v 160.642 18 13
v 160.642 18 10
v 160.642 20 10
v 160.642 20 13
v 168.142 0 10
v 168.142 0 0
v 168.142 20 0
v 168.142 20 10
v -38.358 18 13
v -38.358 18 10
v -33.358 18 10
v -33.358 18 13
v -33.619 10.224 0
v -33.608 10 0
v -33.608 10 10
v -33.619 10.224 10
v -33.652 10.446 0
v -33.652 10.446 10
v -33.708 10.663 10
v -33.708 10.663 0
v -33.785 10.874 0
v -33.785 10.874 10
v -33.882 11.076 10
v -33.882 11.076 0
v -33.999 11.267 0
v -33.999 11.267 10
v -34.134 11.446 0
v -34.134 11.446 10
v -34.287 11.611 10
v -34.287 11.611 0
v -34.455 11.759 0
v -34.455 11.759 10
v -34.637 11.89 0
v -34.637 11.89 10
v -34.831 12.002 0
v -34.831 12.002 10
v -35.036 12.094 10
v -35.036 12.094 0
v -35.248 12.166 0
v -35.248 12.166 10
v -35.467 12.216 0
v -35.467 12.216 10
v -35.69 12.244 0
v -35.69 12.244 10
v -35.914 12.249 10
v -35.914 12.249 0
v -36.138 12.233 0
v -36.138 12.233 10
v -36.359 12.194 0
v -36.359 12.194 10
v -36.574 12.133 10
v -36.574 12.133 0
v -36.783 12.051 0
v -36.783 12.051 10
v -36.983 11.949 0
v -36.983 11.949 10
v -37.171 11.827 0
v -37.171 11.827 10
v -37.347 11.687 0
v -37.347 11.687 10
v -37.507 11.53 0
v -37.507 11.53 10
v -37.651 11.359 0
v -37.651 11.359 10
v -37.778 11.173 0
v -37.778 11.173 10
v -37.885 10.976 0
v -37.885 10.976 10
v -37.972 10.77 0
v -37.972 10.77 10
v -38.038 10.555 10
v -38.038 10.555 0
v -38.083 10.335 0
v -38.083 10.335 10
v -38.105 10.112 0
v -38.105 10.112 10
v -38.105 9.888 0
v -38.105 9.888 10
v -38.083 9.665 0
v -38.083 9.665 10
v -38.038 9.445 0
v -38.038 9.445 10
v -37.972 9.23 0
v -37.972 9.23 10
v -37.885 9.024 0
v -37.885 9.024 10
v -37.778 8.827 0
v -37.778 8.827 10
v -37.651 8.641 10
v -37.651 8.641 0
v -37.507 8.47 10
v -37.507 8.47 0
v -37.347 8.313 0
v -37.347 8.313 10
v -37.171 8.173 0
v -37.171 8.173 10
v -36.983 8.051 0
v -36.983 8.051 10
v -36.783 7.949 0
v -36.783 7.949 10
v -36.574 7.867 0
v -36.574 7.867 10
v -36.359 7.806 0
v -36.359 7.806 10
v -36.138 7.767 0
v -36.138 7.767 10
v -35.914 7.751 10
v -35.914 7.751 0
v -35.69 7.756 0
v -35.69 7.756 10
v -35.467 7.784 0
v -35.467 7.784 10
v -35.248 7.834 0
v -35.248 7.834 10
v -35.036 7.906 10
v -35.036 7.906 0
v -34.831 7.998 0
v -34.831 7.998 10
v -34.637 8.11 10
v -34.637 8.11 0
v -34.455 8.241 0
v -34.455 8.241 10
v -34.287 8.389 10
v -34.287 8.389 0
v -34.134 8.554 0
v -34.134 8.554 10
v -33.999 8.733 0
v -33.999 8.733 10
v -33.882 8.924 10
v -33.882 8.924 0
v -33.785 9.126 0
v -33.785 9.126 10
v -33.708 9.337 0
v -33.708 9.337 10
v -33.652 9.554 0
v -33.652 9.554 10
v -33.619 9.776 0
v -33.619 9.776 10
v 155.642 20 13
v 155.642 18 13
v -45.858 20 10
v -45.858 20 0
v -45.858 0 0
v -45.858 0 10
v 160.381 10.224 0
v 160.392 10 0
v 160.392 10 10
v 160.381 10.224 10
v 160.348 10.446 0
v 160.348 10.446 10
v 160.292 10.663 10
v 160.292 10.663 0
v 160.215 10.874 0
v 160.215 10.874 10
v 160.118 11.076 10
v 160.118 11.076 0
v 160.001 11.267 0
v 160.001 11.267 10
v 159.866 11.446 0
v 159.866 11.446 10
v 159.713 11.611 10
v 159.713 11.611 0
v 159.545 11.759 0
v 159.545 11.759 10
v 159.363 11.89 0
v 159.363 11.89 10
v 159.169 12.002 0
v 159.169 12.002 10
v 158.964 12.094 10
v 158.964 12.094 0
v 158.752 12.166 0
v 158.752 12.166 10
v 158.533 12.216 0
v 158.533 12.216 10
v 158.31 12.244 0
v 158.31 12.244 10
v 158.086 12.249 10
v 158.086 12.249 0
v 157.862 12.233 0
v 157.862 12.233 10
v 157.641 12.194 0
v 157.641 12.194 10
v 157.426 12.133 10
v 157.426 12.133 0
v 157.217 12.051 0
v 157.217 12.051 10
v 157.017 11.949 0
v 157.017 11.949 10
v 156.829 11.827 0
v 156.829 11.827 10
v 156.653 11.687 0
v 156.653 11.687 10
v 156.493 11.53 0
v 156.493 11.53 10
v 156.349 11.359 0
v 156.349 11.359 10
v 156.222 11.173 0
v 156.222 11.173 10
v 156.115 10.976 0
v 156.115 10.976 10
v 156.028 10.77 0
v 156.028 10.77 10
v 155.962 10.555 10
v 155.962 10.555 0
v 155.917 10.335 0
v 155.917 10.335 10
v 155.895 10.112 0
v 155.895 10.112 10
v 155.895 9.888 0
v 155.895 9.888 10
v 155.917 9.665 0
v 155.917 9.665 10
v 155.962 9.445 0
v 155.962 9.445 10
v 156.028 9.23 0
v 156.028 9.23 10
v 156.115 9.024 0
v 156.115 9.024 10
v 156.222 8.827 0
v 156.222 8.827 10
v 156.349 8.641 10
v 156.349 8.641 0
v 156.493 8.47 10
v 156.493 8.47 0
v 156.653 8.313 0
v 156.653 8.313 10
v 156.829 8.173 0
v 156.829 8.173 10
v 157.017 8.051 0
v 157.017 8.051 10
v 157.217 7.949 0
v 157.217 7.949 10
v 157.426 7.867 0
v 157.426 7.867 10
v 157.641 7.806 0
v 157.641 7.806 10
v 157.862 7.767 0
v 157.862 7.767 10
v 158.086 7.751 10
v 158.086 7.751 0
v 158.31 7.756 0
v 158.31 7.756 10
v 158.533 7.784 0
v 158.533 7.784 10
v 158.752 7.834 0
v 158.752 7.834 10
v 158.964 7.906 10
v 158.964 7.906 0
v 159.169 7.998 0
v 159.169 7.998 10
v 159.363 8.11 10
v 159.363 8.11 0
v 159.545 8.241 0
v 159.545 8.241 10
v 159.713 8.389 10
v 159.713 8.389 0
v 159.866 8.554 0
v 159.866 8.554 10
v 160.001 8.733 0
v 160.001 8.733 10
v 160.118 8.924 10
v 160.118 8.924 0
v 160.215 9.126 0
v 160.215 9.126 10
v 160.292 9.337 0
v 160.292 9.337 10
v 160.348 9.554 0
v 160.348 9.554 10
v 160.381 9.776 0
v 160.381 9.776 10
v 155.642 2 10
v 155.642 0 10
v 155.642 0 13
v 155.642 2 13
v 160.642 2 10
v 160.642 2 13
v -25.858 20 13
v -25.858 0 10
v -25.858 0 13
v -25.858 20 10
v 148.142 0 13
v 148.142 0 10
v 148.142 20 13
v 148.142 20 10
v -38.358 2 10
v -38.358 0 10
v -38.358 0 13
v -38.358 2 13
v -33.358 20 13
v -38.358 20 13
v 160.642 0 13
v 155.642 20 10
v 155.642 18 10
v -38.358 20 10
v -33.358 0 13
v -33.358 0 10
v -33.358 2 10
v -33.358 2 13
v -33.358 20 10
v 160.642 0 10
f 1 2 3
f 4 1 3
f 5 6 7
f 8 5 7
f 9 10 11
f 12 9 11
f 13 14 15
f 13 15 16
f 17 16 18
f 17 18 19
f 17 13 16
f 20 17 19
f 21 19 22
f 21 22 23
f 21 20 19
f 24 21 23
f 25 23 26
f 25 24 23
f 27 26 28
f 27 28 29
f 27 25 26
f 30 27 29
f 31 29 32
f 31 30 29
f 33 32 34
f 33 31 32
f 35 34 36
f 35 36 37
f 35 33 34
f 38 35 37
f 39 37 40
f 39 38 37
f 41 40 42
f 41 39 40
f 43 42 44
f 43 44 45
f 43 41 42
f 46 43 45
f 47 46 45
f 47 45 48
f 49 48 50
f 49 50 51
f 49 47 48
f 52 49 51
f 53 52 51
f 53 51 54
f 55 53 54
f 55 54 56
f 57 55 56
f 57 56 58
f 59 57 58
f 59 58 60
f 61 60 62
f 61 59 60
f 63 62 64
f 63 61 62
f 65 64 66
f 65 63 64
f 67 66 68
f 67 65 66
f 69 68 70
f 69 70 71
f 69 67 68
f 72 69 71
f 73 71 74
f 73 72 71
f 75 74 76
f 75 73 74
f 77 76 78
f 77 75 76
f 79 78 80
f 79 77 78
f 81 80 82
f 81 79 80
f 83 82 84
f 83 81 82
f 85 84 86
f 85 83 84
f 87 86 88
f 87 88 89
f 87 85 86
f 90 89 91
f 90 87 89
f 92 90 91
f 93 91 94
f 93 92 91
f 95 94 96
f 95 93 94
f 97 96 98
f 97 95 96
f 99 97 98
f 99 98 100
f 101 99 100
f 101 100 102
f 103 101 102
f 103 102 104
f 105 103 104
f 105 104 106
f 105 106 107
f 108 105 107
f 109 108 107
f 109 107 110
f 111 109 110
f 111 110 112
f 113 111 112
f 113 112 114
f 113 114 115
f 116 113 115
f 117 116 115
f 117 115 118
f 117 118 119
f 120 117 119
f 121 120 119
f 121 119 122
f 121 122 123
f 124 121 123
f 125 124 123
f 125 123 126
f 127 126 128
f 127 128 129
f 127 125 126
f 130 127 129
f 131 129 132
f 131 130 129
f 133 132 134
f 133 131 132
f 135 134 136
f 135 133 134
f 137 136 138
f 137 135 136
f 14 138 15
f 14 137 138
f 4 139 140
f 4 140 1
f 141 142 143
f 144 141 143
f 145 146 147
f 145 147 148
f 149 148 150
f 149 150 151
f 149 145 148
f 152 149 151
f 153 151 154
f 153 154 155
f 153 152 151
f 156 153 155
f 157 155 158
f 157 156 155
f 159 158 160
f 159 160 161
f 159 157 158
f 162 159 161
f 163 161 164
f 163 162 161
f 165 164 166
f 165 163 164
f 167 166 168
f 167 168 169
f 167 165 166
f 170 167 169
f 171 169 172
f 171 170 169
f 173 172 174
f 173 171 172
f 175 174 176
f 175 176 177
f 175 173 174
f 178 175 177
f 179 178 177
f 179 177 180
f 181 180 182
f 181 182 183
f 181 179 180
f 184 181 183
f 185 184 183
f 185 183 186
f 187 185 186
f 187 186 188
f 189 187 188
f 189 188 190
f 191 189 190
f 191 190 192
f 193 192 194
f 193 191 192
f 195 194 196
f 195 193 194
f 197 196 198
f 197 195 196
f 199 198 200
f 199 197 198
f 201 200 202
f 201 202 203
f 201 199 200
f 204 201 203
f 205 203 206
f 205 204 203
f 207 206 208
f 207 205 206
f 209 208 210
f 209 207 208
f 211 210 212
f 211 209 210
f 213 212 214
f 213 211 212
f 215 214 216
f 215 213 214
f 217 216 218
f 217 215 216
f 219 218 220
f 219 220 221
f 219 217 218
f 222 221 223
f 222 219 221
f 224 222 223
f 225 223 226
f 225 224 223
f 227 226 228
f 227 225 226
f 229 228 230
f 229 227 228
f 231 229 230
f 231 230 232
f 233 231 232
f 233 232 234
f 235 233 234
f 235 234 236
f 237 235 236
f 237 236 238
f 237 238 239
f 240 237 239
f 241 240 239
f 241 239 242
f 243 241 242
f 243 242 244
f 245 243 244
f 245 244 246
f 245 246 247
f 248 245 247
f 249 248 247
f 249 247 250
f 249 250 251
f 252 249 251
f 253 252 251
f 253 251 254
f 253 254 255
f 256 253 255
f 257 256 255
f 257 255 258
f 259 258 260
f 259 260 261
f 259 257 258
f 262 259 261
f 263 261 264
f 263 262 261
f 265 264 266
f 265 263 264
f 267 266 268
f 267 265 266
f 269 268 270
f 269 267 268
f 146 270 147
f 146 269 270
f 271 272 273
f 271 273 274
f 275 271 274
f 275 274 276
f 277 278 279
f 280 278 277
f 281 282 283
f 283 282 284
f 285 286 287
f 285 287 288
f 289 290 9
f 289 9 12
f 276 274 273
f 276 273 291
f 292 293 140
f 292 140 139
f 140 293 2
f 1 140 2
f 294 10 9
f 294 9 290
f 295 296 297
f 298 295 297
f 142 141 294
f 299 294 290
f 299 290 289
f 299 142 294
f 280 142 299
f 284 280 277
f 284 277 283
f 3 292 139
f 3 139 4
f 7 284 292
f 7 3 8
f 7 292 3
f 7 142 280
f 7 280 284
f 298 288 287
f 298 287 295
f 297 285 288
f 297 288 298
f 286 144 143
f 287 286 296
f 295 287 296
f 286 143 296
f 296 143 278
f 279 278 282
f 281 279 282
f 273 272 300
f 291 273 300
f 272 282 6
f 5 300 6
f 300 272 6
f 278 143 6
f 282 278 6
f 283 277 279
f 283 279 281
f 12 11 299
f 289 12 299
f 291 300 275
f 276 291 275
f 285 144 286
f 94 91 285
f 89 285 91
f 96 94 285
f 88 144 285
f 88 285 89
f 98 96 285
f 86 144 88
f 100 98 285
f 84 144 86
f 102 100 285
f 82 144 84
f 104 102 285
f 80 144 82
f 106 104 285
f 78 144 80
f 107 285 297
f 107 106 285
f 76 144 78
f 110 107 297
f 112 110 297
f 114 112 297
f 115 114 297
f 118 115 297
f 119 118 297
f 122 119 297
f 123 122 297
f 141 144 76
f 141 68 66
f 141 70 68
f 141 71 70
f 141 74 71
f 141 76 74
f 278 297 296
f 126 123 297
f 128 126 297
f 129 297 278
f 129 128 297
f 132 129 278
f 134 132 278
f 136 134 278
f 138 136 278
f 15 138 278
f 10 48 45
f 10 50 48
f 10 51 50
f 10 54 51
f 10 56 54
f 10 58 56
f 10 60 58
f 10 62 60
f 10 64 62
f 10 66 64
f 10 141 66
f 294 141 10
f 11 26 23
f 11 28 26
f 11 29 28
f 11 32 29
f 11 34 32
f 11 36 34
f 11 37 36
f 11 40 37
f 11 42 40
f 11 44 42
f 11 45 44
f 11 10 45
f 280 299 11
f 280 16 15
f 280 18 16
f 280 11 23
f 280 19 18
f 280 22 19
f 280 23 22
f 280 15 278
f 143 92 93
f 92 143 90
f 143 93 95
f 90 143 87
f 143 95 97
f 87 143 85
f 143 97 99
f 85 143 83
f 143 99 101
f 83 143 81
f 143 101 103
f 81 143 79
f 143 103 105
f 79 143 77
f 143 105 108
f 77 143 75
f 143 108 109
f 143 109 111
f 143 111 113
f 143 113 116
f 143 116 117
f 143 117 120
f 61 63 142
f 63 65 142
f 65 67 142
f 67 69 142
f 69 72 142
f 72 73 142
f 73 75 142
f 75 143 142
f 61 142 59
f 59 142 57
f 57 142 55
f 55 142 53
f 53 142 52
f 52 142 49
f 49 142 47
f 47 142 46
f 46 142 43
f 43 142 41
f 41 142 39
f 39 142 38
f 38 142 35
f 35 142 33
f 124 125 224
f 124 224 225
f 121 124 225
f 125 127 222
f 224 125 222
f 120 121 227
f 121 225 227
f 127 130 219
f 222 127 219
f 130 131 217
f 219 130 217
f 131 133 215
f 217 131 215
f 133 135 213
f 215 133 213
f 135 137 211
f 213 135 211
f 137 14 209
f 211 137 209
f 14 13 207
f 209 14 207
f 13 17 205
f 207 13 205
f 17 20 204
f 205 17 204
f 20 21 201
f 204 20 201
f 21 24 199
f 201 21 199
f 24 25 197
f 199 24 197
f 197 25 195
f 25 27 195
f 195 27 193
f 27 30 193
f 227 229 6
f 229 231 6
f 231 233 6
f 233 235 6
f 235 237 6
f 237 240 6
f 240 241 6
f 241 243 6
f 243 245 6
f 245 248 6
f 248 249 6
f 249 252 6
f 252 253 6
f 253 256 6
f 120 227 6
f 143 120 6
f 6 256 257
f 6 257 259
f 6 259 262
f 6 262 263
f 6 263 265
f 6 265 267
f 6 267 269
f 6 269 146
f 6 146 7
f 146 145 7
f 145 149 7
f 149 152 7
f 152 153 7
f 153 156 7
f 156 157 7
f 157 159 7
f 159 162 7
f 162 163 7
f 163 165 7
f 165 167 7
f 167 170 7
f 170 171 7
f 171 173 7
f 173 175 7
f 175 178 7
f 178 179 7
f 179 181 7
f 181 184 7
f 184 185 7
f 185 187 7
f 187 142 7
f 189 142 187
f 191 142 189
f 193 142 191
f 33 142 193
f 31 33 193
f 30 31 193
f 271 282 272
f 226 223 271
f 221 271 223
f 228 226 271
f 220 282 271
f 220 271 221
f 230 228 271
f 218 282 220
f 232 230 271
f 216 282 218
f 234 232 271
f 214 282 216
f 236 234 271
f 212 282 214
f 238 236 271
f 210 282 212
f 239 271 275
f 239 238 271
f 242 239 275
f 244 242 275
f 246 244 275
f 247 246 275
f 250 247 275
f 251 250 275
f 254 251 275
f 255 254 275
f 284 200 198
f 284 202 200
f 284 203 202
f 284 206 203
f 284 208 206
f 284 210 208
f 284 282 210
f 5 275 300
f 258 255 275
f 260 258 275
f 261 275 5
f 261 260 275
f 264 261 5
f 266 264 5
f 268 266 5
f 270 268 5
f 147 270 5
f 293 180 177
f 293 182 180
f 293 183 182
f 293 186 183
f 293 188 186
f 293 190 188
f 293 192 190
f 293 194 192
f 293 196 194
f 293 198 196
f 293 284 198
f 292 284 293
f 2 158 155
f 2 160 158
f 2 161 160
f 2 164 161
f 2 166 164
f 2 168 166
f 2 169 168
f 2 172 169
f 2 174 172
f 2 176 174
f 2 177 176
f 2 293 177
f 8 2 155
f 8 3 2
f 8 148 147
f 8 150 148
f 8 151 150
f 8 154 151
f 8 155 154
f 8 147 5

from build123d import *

# Parameters (mm, degrees)
F0_W     = 174
F0_H     = 20
F1_DEPTH = 13
F0_R     = 2.25
F2_DEPTH = 10
F0_W_2   = 5
F0_H_2   = 2
F3_DEPTH = 13


with BuildPart() as f1:
    # F0 (on Top) → F1 (new body)
    with BuildSketch(Plane.XY):
        with Locations((61.142166, 10)):
            Rectangle(F0_W, F0_H)
    extrude(amount=F1_DEPTH)

    # F0 (on Top) → F2 (join)
    with BuildSketch(Plane.XY):
        Polygon((-45.857834, 20), (-45.857834, 0), (-38.357834, 0), (-38.357834, 2), (-33.357834, 2), (-33.357834, 0), (-25.857834, 0), (-25.857834, 20), (-33.357834, 20), (-33.357834, 18), (-38.357834, 18), (-38.357834, 20), align=None)
        with Locations((-35.857834, 10)):
            Circle(F0_R, mode=Mode.SUBTRACT)
        Polygon((148.142166, 20), (148.142166, 0), (155.642166, 0), (155.642166, 2), (160.642166, 2), (160.642166, 0), (168.142166, 0), (168.142166, 20), (160.642166, 20), (160.642166, 18), (155.642166, 18), (155.642166, 20), align=None)
        with Locations((158.142166, 10)):
            Circle(F0_R, mode=Mode.SUBTRACT)
    extrude(amount=F2_DEPTH)

    # F0 (on Top) → F3 (join)
    with BuildSketch(Plane.XY):
        with Locations((-35.857834, 19)):
            Rectangle(F0_W_2, F0_H_2)
        with Locations((-35.857834, 1)):
            Rectangle(F0_W_2, F0_H_2)
        with Locations((158.142166, 19)):
            Rectangle(F0_W_2, F0_H_2)
        with Locations((158.142166, 1)):
            Rectangle(F0_W_2, F0_H_2)
    extrude(amount=F3_DEPTH)


solid = f1.part
